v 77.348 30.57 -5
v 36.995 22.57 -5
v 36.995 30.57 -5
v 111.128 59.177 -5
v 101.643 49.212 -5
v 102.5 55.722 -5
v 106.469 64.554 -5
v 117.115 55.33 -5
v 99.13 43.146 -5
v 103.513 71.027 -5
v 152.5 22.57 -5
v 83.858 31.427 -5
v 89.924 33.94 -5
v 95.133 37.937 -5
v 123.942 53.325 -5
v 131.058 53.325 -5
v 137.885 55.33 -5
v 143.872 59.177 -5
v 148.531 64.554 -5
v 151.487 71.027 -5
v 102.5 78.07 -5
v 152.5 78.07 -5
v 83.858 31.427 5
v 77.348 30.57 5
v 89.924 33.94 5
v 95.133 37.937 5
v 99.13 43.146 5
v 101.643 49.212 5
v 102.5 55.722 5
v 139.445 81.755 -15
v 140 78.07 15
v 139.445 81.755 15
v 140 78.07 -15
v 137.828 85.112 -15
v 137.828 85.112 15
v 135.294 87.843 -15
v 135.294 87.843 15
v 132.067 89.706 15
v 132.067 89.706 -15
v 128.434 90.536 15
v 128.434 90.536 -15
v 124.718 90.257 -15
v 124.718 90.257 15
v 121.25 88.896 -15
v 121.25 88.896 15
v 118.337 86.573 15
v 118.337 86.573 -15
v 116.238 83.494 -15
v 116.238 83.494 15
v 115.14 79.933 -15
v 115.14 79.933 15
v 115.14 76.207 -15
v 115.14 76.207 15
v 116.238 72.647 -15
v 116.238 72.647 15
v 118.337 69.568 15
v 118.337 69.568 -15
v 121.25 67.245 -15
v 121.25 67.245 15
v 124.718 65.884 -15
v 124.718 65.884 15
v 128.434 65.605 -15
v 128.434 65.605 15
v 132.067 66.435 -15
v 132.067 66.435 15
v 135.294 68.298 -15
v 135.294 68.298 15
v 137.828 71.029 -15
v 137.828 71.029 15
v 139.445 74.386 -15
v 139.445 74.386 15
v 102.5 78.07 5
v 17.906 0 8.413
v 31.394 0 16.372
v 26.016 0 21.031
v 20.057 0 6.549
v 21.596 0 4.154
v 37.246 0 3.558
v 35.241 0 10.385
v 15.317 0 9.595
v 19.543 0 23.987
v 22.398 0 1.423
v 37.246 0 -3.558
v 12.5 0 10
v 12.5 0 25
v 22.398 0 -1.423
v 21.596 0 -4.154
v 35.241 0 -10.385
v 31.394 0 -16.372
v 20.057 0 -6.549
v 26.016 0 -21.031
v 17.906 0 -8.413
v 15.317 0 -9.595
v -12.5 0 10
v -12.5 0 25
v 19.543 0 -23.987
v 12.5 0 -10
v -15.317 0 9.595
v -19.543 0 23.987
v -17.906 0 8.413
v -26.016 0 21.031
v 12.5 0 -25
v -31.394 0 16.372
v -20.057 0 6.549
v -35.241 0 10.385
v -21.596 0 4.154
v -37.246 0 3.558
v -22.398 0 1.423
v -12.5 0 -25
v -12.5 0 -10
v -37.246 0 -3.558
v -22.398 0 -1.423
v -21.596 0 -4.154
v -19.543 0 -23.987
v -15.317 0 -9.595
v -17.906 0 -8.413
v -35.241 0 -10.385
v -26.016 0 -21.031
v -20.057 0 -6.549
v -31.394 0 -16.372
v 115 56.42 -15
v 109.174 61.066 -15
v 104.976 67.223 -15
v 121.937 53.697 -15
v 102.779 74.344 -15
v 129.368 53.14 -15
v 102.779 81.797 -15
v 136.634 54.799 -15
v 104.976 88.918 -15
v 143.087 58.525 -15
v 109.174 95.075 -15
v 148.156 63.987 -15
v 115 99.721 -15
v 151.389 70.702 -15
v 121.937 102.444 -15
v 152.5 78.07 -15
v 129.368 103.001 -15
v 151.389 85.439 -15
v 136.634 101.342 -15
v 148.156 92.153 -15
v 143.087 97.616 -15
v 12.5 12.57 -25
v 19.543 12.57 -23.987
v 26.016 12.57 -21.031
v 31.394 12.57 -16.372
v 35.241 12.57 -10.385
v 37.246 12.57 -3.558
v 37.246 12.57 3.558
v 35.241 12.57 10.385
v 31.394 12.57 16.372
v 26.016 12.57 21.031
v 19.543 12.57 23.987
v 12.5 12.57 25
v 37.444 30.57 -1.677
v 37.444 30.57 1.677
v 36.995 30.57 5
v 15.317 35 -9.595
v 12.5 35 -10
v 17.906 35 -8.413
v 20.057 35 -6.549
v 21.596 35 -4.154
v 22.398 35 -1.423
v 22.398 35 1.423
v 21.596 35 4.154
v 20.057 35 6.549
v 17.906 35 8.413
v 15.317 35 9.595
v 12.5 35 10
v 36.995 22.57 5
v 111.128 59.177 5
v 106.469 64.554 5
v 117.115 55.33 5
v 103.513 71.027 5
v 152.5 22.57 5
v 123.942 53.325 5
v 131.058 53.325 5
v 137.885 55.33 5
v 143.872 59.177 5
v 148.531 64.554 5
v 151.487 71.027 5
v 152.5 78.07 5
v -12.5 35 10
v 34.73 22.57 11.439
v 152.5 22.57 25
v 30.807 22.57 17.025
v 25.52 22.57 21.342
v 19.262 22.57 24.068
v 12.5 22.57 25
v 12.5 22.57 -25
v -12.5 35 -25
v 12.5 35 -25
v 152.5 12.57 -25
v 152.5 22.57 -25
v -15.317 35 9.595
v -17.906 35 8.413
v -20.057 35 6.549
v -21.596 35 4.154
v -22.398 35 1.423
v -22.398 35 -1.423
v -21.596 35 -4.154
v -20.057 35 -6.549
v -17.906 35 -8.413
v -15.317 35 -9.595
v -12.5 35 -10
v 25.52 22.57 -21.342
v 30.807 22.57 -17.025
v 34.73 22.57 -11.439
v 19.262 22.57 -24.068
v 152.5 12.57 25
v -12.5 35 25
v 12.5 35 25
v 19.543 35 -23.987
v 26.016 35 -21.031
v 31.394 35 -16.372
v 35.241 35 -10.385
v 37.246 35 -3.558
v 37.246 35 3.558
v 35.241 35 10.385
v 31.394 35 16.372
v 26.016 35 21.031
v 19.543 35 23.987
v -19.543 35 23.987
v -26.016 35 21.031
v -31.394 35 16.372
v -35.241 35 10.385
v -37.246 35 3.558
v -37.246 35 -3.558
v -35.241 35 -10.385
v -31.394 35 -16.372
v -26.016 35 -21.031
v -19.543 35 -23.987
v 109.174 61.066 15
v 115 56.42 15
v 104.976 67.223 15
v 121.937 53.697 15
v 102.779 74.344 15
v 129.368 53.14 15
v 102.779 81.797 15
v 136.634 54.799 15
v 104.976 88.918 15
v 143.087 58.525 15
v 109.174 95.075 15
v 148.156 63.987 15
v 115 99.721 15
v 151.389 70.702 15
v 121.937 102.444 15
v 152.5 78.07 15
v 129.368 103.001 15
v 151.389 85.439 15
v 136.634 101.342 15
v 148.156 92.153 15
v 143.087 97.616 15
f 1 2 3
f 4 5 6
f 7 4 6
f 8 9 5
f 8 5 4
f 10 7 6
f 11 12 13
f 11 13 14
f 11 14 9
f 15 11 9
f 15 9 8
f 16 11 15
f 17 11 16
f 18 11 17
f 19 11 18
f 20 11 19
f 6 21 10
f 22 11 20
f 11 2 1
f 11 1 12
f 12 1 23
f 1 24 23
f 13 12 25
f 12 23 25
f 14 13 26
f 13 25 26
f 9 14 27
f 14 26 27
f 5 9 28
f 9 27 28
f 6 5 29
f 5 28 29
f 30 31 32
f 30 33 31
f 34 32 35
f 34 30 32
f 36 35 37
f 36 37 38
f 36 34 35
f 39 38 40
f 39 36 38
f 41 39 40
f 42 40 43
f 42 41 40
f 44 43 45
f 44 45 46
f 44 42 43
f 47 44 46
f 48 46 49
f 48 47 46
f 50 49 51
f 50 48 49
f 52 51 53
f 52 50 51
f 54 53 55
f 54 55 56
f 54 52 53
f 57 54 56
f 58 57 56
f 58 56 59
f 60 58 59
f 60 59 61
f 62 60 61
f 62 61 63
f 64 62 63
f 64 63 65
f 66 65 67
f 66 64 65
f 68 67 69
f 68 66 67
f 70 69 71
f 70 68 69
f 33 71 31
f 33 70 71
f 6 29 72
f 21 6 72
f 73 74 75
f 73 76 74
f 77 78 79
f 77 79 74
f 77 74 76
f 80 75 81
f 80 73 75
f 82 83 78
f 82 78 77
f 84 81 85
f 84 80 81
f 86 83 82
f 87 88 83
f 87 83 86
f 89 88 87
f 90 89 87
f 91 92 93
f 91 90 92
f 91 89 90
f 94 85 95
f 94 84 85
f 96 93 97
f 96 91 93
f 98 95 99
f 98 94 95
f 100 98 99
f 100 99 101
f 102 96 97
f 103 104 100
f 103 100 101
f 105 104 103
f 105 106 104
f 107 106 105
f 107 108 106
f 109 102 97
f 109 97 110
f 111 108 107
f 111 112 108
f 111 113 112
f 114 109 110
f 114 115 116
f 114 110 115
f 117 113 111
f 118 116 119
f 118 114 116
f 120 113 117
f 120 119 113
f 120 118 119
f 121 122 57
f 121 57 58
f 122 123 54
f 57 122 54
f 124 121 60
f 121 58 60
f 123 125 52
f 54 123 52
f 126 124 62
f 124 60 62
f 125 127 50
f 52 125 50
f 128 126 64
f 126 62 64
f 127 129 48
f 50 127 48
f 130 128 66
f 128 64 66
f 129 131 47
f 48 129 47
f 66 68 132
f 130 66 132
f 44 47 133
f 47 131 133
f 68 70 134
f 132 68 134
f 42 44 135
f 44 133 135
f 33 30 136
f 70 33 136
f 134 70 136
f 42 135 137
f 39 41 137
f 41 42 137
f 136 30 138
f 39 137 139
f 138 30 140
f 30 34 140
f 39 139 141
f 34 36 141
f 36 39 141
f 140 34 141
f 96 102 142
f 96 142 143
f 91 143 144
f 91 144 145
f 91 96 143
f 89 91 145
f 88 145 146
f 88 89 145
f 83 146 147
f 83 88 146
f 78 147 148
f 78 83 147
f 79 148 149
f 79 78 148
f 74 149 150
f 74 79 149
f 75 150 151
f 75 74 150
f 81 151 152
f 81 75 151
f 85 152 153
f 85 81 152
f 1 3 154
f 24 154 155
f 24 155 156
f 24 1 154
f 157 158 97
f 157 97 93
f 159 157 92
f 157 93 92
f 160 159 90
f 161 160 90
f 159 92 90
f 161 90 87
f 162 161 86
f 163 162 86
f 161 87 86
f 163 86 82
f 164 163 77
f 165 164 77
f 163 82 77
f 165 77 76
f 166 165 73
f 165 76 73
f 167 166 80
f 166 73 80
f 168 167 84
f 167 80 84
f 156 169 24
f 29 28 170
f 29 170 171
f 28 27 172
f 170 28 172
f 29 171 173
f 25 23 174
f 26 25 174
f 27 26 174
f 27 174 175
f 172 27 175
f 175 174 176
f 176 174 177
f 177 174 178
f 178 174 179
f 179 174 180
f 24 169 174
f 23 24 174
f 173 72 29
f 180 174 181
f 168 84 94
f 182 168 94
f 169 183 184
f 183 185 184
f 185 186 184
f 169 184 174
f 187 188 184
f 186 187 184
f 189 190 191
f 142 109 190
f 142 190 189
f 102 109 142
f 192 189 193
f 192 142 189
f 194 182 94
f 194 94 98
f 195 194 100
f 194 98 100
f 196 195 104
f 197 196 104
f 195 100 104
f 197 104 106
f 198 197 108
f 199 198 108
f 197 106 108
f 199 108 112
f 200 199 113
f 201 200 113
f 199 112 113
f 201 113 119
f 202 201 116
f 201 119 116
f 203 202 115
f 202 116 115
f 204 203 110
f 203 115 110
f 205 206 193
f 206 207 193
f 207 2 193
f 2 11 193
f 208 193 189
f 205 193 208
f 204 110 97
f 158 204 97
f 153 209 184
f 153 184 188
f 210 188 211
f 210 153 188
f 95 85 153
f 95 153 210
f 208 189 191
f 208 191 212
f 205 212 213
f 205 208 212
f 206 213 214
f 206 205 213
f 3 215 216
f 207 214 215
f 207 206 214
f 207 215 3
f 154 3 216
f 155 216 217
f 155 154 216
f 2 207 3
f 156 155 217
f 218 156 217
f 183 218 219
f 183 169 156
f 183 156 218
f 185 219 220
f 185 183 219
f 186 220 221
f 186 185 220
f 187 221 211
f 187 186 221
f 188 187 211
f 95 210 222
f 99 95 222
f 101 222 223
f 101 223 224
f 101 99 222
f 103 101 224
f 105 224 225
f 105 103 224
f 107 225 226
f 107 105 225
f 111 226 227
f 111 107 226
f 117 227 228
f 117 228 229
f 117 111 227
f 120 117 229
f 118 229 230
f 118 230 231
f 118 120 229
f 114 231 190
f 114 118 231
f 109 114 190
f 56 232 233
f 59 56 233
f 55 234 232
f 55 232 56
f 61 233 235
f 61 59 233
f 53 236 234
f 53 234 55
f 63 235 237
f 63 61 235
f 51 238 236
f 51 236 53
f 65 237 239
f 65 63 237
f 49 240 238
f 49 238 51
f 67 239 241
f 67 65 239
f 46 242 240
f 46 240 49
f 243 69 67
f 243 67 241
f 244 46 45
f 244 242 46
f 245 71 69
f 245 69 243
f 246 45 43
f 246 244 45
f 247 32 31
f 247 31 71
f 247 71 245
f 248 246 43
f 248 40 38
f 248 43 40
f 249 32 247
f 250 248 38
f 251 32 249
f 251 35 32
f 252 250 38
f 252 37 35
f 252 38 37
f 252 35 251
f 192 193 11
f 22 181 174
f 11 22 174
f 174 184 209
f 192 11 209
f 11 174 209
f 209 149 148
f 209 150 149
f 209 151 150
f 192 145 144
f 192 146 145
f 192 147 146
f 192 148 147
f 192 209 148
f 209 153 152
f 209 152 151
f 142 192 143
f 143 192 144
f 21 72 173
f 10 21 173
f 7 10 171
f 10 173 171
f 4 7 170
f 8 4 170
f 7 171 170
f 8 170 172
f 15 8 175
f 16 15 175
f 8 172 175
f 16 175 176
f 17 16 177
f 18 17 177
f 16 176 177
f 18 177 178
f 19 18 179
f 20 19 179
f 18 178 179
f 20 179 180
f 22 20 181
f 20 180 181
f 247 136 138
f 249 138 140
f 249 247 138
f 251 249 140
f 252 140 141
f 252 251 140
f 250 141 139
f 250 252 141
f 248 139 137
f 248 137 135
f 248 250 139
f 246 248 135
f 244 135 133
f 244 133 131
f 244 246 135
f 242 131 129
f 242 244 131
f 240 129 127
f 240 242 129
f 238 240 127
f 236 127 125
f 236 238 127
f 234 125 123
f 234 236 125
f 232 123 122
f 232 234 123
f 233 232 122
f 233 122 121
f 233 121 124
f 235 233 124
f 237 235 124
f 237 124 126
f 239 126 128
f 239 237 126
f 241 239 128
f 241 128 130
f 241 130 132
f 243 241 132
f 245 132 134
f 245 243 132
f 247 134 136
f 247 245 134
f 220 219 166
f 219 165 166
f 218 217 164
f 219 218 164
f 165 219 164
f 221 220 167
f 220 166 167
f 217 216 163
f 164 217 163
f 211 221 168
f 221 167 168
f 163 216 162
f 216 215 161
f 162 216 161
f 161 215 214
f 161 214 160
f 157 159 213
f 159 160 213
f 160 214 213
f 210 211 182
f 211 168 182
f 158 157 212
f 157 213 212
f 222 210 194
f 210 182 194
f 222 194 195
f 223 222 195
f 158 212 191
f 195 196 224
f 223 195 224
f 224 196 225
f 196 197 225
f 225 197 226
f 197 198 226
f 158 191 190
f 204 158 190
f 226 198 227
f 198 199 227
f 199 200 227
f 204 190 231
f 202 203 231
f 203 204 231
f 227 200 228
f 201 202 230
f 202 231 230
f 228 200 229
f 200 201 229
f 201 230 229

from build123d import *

# Parameters (mm, degrees)
BOSS_EXTRUDE1_DEPTH      = 35
BOSS_EXTRUDE2_REACH      = 211.564
BOSS_EXTRUDE2_END_RADIUS = 25
BOSS_EXTRUDE2_START      = 152.5
SKETCH2_W                = 50
SKETCH2_H                = 10
SKETCH3_R                = 25
SKETCH3_R_2              = 12.5
BOSS_EXTRUDE3_DEPTH      = 15
BOSS_EXTRUDE5_DEPTH      = 5
SKETCH5_W                = 10
SKETCH5_H                = 8
BOSS_EXTRUDE6_DEPTH      = 0.505103


with BuildPart() as part:
    # Sketch1 → Boss-Extrude1 (new body)
    with BuildSketch(Plane(origin=(0, 0, 0), x_dir=(1, 0, 0), z_dir=(0, 1, 0))):
        with BuildLine():
            Line((-12.5, 25), (12.5, 25))
            ThreePointArc((12.5, 25), (37.5, 0), (12.5, -25))
            Line((12.5, -25), (-12.5, -25))
            ThreePointArc((-12.5, -25), (-37.5, 0), (-12.5, 25))
        make_face()
        with BuildLine():
            Line((-12.5, 10), (12.5, 10))
            ThreePointArc((12.5, 10), (22.5, 0), (12.5, -10))
            Line((12.5, -10), (-12.5, -10))
            ThreePointArc((-12.5, -10), (-22.5, 0), (-12.5, 10))
        make_face(mode=Mode.SUBTRACT)
    extrude(amount=BOSS_EXTRUDE1_DEPTH)

    # Boss-Extrude2: up to this cylinder (the profile starts outside it)
    boss_extrude2_end = Plane(origin=(12.5, 17.570467, 0), z_dir=(0, -1, 0)) * Cylinder(BOSS_EXTRUDE2_END_RADIUS, 474.128, mode=Mode.PRIVATE)
    # Sketch2 → Boss-Extrude2 (add, up to the surface)
    with BuildSketch(Plane(origin=(0, 0, 0), x_dir=(0, 0, -1), z_dir=(1, 0, 0)).offset(BOSS_EXTRUDE2_START), mode=Mode.PRIVATE) as boss_extrude2_sk1:
        with Locations((0, 17.570467399)):
            Rectangle(SKETCH2_W, SKETCH2_H)
    boss_extrude2_tool1 = extrude(boss_extrude2_sk1.sketch, amount=-BOSS_EXTRUDE2_REACH, mode=Mode.PRIVATE) - boss_extrude2_end
    add(boss_extrude2_tool1.solids().sort_by_distance((152.5, 17.570467, 0))[0])



with BuildPart() as body_2:
    # Sketch3 → Boss-Extrude3 (new, symmetric)
    with BuildSketch(Plane.XY):
        with Locations((127.5, 78.070467399)):
            Circle(SKETCH3_R)
        with Locations((127.5, 78.070467399)):
            Circle(SKETCH3_R_2, mode=Mode.SUBTRACT)
    extrude(amount=BOSS_EXTRUDE3_DEPTH, both=True)


with BuildPart() as body_3:
    # Sketch4 → Boss-Extrude5 (new, symmetric)
    with BuildSketch(Plane.XY):
        with BuildLine():
            Line((152.5, 78.070467399), (152.5, 22.570467399))
            Line((152.5, 22.570467399), (37.5, 22.570467399))
            Line((37.5, 22.570467399), (37.5, 30.570467399))
            Line((37.5, 30.570467399), (77.34821208, 30.570467399))
            ThreePointArc((77.34821208, 30.570467399), (95.133211877, 37.937255521), (102.5, 55.722255318))
            Line((102.5, 55.722255318), (102.5, 78.070467399))
            ThreePointArc((102.5, 78.070467399), (127.5, 53.070467399), (152.5, 78.070467399))
        make_face()
    extrude(amount=BOSS_EXTRUDE5_DEPTH, both=True)


with BuildPart() as part_1:
    add(part.part)

    add(body_3.part)  # Boss-Extrude6 merges body 3
    # Sketch5 → Boss-Extrude6 (add)
    with BuildSketch(Plane.ZY.offset(-37.5)):
        with Locations((0, 26.570467399)):
            Rectangle(SKETCH5_W, SKETCH5_H)
    extrude(amount=BOSS_EXTRUDE6_DEPTH)


solid = Compound([body_2.part, part_1.part])
